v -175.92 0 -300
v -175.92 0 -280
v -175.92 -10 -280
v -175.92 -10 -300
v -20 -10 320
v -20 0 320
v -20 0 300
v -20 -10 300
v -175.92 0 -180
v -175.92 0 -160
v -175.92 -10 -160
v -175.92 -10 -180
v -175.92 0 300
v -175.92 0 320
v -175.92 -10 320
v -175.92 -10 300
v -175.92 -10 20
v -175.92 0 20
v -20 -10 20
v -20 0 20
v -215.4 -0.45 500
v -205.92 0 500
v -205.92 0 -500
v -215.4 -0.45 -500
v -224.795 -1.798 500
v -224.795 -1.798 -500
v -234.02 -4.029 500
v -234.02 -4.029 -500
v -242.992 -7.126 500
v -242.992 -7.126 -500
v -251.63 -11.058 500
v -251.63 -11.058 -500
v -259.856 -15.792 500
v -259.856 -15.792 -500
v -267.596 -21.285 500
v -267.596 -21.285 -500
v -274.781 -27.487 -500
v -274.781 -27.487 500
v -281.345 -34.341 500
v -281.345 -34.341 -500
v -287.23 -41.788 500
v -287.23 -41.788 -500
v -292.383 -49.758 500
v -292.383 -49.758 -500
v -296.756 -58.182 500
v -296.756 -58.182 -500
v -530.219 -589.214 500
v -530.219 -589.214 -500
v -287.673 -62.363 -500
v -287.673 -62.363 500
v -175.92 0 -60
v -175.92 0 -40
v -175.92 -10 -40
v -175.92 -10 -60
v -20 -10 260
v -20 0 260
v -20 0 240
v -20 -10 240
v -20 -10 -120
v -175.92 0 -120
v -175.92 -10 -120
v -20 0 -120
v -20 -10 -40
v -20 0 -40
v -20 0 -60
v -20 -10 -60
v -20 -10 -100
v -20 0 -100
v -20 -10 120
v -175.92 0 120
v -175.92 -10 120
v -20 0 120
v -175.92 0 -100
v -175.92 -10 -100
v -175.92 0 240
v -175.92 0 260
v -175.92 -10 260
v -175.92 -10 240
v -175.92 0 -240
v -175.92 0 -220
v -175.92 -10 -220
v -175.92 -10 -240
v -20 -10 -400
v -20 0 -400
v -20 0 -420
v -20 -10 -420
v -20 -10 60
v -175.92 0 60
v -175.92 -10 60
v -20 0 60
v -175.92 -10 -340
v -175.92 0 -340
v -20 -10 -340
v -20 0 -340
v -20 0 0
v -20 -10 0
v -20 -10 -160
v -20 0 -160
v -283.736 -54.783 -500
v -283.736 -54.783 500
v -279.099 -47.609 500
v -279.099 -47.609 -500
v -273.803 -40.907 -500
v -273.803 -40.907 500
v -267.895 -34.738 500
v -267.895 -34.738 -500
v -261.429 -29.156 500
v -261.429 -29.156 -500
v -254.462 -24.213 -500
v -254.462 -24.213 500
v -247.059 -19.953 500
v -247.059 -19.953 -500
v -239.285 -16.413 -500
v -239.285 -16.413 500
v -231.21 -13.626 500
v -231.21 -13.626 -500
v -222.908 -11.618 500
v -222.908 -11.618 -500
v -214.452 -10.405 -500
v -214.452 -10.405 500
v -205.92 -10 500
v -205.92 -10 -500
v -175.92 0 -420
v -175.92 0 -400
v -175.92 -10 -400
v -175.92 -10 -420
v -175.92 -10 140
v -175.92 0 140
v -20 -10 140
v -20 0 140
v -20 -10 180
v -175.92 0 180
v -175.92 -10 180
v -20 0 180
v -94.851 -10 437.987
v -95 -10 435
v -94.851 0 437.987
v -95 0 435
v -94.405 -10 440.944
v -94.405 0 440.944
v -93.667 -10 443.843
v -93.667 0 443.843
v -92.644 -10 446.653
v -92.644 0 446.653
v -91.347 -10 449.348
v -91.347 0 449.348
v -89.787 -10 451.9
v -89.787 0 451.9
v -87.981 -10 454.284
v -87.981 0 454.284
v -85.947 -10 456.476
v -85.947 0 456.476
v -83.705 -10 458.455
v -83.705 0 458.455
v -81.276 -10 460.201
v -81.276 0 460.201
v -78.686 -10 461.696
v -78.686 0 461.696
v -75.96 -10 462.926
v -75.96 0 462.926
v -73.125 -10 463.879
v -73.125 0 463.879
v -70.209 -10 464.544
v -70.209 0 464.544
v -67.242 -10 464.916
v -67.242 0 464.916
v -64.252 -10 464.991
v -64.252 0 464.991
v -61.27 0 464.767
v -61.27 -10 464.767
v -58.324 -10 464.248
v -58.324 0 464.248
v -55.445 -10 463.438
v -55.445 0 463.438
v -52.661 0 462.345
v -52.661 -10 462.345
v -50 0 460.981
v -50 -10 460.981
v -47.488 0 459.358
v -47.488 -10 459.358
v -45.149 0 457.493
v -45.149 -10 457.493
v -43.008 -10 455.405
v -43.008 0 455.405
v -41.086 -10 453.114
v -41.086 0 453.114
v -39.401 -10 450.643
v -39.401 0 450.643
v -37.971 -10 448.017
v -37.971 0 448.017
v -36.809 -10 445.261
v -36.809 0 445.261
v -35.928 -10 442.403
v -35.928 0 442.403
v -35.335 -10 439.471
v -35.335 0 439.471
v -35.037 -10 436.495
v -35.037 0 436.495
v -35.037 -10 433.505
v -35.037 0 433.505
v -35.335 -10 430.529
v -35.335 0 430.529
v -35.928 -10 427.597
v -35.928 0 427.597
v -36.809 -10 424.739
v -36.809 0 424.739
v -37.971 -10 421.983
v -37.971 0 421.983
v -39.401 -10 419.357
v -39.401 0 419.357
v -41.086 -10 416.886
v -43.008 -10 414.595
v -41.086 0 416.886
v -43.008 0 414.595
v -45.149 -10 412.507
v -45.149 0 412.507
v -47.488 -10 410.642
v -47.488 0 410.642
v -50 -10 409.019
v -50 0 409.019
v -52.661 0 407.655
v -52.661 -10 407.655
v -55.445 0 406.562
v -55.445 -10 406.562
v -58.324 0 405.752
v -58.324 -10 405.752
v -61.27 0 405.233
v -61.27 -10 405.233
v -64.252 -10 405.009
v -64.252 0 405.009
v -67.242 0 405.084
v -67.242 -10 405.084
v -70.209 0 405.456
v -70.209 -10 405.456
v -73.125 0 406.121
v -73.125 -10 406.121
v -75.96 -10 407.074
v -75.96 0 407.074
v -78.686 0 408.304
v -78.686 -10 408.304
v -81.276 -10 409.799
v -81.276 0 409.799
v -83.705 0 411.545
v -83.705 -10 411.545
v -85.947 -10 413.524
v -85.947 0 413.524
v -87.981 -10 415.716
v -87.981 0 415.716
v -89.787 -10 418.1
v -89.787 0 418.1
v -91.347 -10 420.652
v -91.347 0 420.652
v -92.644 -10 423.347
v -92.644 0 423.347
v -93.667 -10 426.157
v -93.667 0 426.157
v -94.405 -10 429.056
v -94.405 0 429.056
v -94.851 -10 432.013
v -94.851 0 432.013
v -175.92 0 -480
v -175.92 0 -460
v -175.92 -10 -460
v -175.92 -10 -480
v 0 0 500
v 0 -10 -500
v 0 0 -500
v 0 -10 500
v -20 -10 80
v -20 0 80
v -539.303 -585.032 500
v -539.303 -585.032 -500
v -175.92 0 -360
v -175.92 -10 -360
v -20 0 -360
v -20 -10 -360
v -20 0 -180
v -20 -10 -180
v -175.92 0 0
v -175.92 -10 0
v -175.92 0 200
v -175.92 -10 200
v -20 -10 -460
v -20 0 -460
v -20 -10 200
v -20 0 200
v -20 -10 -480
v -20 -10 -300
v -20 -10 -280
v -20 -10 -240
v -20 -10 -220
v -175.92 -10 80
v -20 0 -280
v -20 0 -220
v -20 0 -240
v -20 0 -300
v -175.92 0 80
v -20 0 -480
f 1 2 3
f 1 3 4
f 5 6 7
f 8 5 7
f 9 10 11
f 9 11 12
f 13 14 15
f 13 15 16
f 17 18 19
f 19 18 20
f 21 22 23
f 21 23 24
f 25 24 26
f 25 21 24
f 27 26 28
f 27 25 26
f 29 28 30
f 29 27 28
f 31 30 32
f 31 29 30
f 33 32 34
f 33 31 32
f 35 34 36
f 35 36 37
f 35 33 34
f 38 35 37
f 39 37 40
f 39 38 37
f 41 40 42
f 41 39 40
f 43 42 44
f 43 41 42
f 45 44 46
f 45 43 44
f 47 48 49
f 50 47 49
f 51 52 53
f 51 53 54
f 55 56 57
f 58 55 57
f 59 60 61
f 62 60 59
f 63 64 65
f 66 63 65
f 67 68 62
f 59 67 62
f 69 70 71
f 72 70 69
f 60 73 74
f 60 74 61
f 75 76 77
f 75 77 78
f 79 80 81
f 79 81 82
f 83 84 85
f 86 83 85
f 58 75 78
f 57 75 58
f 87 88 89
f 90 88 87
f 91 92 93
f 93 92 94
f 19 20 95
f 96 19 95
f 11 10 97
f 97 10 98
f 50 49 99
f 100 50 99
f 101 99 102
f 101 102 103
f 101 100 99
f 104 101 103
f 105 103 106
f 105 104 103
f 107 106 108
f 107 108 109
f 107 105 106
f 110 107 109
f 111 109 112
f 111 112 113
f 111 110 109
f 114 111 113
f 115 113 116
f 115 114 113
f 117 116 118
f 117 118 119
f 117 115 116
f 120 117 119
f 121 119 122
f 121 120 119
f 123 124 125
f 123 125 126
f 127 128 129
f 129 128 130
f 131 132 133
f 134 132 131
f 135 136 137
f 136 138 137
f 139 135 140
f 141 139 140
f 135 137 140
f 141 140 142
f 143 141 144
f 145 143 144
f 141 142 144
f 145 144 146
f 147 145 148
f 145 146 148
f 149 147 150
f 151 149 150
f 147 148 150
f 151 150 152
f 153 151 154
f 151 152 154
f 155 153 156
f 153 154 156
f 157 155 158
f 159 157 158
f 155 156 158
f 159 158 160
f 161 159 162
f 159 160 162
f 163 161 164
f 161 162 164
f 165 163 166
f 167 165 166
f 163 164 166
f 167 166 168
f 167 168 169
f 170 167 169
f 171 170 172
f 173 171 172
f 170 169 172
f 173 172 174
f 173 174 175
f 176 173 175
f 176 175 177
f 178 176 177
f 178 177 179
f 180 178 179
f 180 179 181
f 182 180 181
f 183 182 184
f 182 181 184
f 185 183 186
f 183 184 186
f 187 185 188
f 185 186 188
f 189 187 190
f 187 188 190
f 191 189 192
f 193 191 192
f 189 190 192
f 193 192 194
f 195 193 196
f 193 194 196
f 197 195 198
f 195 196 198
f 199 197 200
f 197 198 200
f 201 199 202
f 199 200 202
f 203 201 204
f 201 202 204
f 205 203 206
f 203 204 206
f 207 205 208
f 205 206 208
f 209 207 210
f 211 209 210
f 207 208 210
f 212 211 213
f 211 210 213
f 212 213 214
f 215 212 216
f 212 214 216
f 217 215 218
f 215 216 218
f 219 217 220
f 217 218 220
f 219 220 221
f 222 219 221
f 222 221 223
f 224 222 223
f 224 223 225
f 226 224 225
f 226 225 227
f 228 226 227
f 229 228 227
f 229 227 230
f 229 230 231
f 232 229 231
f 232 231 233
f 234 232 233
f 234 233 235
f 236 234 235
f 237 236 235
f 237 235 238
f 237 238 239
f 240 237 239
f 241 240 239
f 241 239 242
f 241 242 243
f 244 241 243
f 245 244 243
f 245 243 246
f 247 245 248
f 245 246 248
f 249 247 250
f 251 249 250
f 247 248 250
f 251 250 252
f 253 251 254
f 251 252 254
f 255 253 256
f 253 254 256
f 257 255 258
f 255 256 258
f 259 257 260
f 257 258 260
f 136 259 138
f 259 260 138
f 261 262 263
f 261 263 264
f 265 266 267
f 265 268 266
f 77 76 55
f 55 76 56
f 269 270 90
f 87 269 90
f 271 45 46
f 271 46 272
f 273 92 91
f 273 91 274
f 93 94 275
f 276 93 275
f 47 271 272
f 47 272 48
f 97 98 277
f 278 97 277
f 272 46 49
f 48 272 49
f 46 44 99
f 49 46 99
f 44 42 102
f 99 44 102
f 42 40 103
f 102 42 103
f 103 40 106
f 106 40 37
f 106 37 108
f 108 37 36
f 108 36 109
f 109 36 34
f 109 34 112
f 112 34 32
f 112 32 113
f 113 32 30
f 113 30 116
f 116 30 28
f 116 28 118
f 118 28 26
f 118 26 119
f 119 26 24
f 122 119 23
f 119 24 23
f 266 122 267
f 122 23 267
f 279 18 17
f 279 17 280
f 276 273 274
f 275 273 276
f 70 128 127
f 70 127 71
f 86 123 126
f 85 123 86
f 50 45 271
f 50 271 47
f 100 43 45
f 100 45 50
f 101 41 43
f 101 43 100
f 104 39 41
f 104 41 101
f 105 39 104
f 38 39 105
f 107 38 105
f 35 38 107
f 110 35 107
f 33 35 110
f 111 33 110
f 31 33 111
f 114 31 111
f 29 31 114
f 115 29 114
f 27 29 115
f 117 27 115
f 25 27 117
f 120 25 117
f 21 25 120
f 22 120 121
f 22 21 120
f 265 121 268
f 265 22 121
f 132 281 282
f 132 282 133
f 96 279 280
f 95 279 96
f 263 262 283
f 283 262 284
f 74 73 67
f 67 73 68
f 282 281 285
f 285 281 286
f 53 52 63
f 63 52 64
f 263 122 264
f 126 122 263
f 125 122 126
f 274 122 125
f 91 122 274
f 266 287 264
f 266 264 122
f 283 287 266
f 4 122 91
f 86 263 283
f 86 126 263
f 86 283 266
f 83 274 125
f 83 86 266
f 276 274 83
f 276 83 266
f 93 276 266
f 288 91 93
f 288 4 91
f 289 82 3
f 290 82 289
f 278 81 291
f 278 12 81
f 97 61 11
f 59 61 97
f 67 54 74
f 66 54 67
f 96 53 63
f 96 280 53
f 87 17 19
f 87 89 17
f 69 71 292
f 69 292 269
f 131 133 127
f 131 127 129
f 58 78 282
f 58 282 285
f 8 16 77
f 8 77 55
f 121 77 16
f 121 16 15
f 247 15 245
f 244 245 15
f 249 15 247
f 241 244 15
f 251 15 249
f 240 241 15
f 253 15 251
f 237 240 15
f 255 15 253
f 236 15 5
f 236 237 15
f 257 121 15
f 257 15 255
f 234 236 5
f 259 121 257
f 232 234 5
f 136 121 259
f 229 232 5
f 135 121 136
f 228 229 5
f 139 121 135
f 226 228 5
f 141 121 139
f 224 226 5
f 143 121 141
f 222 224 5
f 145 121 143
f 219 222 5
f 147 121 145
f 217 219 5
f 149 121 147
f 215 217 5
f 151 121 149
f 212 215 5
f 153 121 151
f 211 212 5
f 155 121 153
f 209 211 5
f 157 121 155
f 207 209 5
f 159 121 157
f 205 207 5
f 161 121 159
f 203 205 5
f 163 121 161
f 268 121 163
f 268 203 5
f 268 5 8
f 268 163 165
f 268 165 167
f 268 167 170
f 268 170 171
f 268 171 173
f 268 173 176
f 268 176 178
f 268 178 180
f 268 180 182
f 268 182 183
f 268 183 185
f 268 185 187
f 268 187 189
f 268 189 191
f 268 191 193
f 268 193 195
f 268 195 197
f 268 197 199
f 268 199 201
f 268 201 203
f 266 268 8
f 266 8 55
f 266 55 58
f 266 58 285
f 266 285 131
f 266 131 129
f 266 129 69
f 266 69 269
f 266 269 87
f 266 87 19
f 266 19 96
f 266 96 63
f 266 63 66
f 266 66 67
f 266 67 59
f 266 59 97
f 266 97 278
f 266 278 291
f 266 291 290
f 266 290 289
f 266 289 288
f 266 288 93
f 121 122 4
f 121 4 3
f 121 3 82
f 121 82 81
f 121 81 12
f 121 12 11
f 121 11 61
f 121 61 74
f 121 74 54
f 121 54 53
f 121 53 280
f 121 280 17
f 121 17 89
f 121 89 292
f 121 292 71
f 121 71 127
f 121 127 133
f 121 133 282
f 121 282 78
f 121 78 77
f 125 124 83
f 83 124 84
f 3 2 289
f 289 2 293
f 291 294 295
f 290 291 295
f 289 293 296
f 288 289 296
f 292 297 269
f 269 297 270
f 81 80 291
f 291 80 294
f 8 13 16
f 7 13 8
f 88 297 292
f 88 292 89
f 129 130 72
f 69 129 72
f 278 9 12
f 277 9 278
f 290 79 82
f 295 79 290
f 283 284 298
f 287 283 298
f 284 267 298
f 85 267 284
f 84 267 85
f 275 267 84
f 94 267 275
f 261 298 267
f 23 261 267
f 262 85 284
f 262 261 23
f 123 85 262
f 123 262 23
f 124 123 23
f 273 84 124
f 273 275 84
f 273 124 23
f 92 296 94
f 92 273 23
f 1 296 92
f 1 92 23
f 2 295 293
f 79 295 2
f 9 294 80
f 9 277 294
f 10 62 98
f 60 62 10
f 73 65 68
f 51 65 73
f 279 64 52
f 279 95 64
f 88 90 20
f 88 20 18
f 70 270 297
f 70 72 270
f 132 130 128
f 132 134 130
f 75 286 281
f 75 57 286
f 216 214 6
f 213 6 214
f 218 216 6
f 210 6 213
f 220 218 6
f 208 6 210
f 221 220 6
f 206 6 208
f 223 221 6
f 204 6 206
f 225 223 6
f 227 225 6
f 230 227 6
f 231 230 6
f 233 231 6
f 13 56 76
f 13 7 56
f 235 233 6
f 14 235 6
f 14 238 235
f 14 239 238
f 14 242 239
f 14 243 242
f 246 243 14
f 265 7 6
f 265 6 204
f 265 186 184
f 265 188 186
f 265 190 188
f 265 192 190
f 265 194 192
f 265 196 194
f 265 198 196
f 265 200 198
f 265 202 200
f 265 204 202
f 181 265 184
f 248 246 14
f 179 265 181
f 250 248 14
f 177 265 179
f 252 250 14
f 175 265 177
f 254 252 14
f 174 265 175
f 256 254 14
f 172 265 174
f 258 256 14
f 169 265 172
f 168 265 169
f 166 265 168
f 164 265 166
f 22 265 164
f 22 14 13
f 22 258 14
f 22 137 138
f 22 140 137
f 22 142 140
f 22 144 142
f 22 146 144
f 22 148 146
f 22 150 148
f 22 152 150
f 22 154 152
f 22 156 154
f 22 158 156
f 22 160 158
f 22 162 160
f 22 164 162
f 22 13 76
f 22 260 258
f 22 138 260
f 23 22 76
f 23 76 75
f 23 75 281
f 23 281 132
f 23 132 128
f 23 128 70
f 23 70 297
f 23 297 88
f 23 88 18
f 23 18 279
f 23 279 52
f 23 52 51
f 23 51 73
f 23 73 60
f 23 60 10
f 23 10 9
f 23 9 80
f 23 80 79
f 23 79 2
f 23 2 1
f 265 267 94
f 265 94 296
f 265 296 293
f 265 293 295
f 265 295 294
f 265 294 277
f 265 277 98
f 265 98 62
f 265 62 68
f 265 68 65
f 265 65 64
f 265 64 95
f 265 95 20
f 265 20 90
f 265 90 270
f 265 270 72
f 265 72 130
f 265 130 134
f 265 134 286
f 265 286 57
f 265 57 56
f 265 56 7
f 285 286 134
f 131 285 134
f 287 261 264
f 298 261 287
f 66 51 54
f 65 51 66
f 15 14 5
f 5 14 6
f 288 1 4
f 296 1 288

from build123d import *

# Parameters (mm, degrees)
EXTRUDE_THIN1_DEPTH = 500
SKETCH3_W           = 155.92
SKETCH3_H           = 20
CUT_EXTRUDE1_DEPTH  = 226
LPATTERN1_COUNT     = 14
LPATTERN1_PITCH     = 60
SKETCH4_R           = 30
CUT_EXTRUDE2_DEPTH  = 226


with BuildPart() as part:
    # Sketch1 → Extrude-Thin1 (new, symmetric)
    with BuildSketch(Plane.XY):
        with BuildLine():
            Line((0, 0), (-205.92, 0))
            ThreePointArc((-205.92, 0), (-259.855879639, -15.792394123), (-296.756225905, -58.181582248))
            Line((-296.756225905, -58.181582248), (-539.303048865, -585.0316925))
            Line((-539.303048865, -585.0316925), (-530.219426274, -589.213534275))
            Line((-530.219426274, -589.213534275), (-287.672603315, -62.363424024))
            ThreePointArc((-287.672603315, -62.363424024), (-254.462291675, -24.21315471), (-205.92, -10))
            Line((-205.92, -10), (0, -10))
            Line((0, -10), (0, 0))
        make_face()
    extrude(amount=EXTRUDE_THIN1_DEPTH, both=True)

    # Sketch3 → Cut-Extrude1 (cut, symmetric)
    with BuildSketch(Plane(origin=(0, 0, 0), x_dir=(1, 0, 0), z_dir=(0, 1, 0))):
        with Locations((-97.96, 470)):
            Rectangle(SKETCH3_W, SKETCH3_H)
    cut_extrude1 = extrude(amount=CUT_EXTRUDE1_DEPTH, both=True, mode=Mode.SUBTRACT)

    # LPattern1: Cut-Extrude1 ×14
    with Locations(*[(0, 0, i * LPATTERN1_PITCH) for i in range(1, LPATTERN1_COUNT)]):
        add(cut_extrude1, mode=Mode.SUBTRACT)

    # Sketch4 → Cut-Extrude2 (cut, symmetric)
    with BuildSketch(Plane(origin=(0, 0, 0), x_dir=(1, 0, 0), z_dir=(0, 1, 0))):
        with Locations(Location((-65, -435, 0), (0, 0, 180))):
            Circle(SKETCH4_R)
    extrude(amount=CUT_EXTRUDE2_DEPTH, both=True, mode=Mode.SUBTRACT)


solid = part.part
